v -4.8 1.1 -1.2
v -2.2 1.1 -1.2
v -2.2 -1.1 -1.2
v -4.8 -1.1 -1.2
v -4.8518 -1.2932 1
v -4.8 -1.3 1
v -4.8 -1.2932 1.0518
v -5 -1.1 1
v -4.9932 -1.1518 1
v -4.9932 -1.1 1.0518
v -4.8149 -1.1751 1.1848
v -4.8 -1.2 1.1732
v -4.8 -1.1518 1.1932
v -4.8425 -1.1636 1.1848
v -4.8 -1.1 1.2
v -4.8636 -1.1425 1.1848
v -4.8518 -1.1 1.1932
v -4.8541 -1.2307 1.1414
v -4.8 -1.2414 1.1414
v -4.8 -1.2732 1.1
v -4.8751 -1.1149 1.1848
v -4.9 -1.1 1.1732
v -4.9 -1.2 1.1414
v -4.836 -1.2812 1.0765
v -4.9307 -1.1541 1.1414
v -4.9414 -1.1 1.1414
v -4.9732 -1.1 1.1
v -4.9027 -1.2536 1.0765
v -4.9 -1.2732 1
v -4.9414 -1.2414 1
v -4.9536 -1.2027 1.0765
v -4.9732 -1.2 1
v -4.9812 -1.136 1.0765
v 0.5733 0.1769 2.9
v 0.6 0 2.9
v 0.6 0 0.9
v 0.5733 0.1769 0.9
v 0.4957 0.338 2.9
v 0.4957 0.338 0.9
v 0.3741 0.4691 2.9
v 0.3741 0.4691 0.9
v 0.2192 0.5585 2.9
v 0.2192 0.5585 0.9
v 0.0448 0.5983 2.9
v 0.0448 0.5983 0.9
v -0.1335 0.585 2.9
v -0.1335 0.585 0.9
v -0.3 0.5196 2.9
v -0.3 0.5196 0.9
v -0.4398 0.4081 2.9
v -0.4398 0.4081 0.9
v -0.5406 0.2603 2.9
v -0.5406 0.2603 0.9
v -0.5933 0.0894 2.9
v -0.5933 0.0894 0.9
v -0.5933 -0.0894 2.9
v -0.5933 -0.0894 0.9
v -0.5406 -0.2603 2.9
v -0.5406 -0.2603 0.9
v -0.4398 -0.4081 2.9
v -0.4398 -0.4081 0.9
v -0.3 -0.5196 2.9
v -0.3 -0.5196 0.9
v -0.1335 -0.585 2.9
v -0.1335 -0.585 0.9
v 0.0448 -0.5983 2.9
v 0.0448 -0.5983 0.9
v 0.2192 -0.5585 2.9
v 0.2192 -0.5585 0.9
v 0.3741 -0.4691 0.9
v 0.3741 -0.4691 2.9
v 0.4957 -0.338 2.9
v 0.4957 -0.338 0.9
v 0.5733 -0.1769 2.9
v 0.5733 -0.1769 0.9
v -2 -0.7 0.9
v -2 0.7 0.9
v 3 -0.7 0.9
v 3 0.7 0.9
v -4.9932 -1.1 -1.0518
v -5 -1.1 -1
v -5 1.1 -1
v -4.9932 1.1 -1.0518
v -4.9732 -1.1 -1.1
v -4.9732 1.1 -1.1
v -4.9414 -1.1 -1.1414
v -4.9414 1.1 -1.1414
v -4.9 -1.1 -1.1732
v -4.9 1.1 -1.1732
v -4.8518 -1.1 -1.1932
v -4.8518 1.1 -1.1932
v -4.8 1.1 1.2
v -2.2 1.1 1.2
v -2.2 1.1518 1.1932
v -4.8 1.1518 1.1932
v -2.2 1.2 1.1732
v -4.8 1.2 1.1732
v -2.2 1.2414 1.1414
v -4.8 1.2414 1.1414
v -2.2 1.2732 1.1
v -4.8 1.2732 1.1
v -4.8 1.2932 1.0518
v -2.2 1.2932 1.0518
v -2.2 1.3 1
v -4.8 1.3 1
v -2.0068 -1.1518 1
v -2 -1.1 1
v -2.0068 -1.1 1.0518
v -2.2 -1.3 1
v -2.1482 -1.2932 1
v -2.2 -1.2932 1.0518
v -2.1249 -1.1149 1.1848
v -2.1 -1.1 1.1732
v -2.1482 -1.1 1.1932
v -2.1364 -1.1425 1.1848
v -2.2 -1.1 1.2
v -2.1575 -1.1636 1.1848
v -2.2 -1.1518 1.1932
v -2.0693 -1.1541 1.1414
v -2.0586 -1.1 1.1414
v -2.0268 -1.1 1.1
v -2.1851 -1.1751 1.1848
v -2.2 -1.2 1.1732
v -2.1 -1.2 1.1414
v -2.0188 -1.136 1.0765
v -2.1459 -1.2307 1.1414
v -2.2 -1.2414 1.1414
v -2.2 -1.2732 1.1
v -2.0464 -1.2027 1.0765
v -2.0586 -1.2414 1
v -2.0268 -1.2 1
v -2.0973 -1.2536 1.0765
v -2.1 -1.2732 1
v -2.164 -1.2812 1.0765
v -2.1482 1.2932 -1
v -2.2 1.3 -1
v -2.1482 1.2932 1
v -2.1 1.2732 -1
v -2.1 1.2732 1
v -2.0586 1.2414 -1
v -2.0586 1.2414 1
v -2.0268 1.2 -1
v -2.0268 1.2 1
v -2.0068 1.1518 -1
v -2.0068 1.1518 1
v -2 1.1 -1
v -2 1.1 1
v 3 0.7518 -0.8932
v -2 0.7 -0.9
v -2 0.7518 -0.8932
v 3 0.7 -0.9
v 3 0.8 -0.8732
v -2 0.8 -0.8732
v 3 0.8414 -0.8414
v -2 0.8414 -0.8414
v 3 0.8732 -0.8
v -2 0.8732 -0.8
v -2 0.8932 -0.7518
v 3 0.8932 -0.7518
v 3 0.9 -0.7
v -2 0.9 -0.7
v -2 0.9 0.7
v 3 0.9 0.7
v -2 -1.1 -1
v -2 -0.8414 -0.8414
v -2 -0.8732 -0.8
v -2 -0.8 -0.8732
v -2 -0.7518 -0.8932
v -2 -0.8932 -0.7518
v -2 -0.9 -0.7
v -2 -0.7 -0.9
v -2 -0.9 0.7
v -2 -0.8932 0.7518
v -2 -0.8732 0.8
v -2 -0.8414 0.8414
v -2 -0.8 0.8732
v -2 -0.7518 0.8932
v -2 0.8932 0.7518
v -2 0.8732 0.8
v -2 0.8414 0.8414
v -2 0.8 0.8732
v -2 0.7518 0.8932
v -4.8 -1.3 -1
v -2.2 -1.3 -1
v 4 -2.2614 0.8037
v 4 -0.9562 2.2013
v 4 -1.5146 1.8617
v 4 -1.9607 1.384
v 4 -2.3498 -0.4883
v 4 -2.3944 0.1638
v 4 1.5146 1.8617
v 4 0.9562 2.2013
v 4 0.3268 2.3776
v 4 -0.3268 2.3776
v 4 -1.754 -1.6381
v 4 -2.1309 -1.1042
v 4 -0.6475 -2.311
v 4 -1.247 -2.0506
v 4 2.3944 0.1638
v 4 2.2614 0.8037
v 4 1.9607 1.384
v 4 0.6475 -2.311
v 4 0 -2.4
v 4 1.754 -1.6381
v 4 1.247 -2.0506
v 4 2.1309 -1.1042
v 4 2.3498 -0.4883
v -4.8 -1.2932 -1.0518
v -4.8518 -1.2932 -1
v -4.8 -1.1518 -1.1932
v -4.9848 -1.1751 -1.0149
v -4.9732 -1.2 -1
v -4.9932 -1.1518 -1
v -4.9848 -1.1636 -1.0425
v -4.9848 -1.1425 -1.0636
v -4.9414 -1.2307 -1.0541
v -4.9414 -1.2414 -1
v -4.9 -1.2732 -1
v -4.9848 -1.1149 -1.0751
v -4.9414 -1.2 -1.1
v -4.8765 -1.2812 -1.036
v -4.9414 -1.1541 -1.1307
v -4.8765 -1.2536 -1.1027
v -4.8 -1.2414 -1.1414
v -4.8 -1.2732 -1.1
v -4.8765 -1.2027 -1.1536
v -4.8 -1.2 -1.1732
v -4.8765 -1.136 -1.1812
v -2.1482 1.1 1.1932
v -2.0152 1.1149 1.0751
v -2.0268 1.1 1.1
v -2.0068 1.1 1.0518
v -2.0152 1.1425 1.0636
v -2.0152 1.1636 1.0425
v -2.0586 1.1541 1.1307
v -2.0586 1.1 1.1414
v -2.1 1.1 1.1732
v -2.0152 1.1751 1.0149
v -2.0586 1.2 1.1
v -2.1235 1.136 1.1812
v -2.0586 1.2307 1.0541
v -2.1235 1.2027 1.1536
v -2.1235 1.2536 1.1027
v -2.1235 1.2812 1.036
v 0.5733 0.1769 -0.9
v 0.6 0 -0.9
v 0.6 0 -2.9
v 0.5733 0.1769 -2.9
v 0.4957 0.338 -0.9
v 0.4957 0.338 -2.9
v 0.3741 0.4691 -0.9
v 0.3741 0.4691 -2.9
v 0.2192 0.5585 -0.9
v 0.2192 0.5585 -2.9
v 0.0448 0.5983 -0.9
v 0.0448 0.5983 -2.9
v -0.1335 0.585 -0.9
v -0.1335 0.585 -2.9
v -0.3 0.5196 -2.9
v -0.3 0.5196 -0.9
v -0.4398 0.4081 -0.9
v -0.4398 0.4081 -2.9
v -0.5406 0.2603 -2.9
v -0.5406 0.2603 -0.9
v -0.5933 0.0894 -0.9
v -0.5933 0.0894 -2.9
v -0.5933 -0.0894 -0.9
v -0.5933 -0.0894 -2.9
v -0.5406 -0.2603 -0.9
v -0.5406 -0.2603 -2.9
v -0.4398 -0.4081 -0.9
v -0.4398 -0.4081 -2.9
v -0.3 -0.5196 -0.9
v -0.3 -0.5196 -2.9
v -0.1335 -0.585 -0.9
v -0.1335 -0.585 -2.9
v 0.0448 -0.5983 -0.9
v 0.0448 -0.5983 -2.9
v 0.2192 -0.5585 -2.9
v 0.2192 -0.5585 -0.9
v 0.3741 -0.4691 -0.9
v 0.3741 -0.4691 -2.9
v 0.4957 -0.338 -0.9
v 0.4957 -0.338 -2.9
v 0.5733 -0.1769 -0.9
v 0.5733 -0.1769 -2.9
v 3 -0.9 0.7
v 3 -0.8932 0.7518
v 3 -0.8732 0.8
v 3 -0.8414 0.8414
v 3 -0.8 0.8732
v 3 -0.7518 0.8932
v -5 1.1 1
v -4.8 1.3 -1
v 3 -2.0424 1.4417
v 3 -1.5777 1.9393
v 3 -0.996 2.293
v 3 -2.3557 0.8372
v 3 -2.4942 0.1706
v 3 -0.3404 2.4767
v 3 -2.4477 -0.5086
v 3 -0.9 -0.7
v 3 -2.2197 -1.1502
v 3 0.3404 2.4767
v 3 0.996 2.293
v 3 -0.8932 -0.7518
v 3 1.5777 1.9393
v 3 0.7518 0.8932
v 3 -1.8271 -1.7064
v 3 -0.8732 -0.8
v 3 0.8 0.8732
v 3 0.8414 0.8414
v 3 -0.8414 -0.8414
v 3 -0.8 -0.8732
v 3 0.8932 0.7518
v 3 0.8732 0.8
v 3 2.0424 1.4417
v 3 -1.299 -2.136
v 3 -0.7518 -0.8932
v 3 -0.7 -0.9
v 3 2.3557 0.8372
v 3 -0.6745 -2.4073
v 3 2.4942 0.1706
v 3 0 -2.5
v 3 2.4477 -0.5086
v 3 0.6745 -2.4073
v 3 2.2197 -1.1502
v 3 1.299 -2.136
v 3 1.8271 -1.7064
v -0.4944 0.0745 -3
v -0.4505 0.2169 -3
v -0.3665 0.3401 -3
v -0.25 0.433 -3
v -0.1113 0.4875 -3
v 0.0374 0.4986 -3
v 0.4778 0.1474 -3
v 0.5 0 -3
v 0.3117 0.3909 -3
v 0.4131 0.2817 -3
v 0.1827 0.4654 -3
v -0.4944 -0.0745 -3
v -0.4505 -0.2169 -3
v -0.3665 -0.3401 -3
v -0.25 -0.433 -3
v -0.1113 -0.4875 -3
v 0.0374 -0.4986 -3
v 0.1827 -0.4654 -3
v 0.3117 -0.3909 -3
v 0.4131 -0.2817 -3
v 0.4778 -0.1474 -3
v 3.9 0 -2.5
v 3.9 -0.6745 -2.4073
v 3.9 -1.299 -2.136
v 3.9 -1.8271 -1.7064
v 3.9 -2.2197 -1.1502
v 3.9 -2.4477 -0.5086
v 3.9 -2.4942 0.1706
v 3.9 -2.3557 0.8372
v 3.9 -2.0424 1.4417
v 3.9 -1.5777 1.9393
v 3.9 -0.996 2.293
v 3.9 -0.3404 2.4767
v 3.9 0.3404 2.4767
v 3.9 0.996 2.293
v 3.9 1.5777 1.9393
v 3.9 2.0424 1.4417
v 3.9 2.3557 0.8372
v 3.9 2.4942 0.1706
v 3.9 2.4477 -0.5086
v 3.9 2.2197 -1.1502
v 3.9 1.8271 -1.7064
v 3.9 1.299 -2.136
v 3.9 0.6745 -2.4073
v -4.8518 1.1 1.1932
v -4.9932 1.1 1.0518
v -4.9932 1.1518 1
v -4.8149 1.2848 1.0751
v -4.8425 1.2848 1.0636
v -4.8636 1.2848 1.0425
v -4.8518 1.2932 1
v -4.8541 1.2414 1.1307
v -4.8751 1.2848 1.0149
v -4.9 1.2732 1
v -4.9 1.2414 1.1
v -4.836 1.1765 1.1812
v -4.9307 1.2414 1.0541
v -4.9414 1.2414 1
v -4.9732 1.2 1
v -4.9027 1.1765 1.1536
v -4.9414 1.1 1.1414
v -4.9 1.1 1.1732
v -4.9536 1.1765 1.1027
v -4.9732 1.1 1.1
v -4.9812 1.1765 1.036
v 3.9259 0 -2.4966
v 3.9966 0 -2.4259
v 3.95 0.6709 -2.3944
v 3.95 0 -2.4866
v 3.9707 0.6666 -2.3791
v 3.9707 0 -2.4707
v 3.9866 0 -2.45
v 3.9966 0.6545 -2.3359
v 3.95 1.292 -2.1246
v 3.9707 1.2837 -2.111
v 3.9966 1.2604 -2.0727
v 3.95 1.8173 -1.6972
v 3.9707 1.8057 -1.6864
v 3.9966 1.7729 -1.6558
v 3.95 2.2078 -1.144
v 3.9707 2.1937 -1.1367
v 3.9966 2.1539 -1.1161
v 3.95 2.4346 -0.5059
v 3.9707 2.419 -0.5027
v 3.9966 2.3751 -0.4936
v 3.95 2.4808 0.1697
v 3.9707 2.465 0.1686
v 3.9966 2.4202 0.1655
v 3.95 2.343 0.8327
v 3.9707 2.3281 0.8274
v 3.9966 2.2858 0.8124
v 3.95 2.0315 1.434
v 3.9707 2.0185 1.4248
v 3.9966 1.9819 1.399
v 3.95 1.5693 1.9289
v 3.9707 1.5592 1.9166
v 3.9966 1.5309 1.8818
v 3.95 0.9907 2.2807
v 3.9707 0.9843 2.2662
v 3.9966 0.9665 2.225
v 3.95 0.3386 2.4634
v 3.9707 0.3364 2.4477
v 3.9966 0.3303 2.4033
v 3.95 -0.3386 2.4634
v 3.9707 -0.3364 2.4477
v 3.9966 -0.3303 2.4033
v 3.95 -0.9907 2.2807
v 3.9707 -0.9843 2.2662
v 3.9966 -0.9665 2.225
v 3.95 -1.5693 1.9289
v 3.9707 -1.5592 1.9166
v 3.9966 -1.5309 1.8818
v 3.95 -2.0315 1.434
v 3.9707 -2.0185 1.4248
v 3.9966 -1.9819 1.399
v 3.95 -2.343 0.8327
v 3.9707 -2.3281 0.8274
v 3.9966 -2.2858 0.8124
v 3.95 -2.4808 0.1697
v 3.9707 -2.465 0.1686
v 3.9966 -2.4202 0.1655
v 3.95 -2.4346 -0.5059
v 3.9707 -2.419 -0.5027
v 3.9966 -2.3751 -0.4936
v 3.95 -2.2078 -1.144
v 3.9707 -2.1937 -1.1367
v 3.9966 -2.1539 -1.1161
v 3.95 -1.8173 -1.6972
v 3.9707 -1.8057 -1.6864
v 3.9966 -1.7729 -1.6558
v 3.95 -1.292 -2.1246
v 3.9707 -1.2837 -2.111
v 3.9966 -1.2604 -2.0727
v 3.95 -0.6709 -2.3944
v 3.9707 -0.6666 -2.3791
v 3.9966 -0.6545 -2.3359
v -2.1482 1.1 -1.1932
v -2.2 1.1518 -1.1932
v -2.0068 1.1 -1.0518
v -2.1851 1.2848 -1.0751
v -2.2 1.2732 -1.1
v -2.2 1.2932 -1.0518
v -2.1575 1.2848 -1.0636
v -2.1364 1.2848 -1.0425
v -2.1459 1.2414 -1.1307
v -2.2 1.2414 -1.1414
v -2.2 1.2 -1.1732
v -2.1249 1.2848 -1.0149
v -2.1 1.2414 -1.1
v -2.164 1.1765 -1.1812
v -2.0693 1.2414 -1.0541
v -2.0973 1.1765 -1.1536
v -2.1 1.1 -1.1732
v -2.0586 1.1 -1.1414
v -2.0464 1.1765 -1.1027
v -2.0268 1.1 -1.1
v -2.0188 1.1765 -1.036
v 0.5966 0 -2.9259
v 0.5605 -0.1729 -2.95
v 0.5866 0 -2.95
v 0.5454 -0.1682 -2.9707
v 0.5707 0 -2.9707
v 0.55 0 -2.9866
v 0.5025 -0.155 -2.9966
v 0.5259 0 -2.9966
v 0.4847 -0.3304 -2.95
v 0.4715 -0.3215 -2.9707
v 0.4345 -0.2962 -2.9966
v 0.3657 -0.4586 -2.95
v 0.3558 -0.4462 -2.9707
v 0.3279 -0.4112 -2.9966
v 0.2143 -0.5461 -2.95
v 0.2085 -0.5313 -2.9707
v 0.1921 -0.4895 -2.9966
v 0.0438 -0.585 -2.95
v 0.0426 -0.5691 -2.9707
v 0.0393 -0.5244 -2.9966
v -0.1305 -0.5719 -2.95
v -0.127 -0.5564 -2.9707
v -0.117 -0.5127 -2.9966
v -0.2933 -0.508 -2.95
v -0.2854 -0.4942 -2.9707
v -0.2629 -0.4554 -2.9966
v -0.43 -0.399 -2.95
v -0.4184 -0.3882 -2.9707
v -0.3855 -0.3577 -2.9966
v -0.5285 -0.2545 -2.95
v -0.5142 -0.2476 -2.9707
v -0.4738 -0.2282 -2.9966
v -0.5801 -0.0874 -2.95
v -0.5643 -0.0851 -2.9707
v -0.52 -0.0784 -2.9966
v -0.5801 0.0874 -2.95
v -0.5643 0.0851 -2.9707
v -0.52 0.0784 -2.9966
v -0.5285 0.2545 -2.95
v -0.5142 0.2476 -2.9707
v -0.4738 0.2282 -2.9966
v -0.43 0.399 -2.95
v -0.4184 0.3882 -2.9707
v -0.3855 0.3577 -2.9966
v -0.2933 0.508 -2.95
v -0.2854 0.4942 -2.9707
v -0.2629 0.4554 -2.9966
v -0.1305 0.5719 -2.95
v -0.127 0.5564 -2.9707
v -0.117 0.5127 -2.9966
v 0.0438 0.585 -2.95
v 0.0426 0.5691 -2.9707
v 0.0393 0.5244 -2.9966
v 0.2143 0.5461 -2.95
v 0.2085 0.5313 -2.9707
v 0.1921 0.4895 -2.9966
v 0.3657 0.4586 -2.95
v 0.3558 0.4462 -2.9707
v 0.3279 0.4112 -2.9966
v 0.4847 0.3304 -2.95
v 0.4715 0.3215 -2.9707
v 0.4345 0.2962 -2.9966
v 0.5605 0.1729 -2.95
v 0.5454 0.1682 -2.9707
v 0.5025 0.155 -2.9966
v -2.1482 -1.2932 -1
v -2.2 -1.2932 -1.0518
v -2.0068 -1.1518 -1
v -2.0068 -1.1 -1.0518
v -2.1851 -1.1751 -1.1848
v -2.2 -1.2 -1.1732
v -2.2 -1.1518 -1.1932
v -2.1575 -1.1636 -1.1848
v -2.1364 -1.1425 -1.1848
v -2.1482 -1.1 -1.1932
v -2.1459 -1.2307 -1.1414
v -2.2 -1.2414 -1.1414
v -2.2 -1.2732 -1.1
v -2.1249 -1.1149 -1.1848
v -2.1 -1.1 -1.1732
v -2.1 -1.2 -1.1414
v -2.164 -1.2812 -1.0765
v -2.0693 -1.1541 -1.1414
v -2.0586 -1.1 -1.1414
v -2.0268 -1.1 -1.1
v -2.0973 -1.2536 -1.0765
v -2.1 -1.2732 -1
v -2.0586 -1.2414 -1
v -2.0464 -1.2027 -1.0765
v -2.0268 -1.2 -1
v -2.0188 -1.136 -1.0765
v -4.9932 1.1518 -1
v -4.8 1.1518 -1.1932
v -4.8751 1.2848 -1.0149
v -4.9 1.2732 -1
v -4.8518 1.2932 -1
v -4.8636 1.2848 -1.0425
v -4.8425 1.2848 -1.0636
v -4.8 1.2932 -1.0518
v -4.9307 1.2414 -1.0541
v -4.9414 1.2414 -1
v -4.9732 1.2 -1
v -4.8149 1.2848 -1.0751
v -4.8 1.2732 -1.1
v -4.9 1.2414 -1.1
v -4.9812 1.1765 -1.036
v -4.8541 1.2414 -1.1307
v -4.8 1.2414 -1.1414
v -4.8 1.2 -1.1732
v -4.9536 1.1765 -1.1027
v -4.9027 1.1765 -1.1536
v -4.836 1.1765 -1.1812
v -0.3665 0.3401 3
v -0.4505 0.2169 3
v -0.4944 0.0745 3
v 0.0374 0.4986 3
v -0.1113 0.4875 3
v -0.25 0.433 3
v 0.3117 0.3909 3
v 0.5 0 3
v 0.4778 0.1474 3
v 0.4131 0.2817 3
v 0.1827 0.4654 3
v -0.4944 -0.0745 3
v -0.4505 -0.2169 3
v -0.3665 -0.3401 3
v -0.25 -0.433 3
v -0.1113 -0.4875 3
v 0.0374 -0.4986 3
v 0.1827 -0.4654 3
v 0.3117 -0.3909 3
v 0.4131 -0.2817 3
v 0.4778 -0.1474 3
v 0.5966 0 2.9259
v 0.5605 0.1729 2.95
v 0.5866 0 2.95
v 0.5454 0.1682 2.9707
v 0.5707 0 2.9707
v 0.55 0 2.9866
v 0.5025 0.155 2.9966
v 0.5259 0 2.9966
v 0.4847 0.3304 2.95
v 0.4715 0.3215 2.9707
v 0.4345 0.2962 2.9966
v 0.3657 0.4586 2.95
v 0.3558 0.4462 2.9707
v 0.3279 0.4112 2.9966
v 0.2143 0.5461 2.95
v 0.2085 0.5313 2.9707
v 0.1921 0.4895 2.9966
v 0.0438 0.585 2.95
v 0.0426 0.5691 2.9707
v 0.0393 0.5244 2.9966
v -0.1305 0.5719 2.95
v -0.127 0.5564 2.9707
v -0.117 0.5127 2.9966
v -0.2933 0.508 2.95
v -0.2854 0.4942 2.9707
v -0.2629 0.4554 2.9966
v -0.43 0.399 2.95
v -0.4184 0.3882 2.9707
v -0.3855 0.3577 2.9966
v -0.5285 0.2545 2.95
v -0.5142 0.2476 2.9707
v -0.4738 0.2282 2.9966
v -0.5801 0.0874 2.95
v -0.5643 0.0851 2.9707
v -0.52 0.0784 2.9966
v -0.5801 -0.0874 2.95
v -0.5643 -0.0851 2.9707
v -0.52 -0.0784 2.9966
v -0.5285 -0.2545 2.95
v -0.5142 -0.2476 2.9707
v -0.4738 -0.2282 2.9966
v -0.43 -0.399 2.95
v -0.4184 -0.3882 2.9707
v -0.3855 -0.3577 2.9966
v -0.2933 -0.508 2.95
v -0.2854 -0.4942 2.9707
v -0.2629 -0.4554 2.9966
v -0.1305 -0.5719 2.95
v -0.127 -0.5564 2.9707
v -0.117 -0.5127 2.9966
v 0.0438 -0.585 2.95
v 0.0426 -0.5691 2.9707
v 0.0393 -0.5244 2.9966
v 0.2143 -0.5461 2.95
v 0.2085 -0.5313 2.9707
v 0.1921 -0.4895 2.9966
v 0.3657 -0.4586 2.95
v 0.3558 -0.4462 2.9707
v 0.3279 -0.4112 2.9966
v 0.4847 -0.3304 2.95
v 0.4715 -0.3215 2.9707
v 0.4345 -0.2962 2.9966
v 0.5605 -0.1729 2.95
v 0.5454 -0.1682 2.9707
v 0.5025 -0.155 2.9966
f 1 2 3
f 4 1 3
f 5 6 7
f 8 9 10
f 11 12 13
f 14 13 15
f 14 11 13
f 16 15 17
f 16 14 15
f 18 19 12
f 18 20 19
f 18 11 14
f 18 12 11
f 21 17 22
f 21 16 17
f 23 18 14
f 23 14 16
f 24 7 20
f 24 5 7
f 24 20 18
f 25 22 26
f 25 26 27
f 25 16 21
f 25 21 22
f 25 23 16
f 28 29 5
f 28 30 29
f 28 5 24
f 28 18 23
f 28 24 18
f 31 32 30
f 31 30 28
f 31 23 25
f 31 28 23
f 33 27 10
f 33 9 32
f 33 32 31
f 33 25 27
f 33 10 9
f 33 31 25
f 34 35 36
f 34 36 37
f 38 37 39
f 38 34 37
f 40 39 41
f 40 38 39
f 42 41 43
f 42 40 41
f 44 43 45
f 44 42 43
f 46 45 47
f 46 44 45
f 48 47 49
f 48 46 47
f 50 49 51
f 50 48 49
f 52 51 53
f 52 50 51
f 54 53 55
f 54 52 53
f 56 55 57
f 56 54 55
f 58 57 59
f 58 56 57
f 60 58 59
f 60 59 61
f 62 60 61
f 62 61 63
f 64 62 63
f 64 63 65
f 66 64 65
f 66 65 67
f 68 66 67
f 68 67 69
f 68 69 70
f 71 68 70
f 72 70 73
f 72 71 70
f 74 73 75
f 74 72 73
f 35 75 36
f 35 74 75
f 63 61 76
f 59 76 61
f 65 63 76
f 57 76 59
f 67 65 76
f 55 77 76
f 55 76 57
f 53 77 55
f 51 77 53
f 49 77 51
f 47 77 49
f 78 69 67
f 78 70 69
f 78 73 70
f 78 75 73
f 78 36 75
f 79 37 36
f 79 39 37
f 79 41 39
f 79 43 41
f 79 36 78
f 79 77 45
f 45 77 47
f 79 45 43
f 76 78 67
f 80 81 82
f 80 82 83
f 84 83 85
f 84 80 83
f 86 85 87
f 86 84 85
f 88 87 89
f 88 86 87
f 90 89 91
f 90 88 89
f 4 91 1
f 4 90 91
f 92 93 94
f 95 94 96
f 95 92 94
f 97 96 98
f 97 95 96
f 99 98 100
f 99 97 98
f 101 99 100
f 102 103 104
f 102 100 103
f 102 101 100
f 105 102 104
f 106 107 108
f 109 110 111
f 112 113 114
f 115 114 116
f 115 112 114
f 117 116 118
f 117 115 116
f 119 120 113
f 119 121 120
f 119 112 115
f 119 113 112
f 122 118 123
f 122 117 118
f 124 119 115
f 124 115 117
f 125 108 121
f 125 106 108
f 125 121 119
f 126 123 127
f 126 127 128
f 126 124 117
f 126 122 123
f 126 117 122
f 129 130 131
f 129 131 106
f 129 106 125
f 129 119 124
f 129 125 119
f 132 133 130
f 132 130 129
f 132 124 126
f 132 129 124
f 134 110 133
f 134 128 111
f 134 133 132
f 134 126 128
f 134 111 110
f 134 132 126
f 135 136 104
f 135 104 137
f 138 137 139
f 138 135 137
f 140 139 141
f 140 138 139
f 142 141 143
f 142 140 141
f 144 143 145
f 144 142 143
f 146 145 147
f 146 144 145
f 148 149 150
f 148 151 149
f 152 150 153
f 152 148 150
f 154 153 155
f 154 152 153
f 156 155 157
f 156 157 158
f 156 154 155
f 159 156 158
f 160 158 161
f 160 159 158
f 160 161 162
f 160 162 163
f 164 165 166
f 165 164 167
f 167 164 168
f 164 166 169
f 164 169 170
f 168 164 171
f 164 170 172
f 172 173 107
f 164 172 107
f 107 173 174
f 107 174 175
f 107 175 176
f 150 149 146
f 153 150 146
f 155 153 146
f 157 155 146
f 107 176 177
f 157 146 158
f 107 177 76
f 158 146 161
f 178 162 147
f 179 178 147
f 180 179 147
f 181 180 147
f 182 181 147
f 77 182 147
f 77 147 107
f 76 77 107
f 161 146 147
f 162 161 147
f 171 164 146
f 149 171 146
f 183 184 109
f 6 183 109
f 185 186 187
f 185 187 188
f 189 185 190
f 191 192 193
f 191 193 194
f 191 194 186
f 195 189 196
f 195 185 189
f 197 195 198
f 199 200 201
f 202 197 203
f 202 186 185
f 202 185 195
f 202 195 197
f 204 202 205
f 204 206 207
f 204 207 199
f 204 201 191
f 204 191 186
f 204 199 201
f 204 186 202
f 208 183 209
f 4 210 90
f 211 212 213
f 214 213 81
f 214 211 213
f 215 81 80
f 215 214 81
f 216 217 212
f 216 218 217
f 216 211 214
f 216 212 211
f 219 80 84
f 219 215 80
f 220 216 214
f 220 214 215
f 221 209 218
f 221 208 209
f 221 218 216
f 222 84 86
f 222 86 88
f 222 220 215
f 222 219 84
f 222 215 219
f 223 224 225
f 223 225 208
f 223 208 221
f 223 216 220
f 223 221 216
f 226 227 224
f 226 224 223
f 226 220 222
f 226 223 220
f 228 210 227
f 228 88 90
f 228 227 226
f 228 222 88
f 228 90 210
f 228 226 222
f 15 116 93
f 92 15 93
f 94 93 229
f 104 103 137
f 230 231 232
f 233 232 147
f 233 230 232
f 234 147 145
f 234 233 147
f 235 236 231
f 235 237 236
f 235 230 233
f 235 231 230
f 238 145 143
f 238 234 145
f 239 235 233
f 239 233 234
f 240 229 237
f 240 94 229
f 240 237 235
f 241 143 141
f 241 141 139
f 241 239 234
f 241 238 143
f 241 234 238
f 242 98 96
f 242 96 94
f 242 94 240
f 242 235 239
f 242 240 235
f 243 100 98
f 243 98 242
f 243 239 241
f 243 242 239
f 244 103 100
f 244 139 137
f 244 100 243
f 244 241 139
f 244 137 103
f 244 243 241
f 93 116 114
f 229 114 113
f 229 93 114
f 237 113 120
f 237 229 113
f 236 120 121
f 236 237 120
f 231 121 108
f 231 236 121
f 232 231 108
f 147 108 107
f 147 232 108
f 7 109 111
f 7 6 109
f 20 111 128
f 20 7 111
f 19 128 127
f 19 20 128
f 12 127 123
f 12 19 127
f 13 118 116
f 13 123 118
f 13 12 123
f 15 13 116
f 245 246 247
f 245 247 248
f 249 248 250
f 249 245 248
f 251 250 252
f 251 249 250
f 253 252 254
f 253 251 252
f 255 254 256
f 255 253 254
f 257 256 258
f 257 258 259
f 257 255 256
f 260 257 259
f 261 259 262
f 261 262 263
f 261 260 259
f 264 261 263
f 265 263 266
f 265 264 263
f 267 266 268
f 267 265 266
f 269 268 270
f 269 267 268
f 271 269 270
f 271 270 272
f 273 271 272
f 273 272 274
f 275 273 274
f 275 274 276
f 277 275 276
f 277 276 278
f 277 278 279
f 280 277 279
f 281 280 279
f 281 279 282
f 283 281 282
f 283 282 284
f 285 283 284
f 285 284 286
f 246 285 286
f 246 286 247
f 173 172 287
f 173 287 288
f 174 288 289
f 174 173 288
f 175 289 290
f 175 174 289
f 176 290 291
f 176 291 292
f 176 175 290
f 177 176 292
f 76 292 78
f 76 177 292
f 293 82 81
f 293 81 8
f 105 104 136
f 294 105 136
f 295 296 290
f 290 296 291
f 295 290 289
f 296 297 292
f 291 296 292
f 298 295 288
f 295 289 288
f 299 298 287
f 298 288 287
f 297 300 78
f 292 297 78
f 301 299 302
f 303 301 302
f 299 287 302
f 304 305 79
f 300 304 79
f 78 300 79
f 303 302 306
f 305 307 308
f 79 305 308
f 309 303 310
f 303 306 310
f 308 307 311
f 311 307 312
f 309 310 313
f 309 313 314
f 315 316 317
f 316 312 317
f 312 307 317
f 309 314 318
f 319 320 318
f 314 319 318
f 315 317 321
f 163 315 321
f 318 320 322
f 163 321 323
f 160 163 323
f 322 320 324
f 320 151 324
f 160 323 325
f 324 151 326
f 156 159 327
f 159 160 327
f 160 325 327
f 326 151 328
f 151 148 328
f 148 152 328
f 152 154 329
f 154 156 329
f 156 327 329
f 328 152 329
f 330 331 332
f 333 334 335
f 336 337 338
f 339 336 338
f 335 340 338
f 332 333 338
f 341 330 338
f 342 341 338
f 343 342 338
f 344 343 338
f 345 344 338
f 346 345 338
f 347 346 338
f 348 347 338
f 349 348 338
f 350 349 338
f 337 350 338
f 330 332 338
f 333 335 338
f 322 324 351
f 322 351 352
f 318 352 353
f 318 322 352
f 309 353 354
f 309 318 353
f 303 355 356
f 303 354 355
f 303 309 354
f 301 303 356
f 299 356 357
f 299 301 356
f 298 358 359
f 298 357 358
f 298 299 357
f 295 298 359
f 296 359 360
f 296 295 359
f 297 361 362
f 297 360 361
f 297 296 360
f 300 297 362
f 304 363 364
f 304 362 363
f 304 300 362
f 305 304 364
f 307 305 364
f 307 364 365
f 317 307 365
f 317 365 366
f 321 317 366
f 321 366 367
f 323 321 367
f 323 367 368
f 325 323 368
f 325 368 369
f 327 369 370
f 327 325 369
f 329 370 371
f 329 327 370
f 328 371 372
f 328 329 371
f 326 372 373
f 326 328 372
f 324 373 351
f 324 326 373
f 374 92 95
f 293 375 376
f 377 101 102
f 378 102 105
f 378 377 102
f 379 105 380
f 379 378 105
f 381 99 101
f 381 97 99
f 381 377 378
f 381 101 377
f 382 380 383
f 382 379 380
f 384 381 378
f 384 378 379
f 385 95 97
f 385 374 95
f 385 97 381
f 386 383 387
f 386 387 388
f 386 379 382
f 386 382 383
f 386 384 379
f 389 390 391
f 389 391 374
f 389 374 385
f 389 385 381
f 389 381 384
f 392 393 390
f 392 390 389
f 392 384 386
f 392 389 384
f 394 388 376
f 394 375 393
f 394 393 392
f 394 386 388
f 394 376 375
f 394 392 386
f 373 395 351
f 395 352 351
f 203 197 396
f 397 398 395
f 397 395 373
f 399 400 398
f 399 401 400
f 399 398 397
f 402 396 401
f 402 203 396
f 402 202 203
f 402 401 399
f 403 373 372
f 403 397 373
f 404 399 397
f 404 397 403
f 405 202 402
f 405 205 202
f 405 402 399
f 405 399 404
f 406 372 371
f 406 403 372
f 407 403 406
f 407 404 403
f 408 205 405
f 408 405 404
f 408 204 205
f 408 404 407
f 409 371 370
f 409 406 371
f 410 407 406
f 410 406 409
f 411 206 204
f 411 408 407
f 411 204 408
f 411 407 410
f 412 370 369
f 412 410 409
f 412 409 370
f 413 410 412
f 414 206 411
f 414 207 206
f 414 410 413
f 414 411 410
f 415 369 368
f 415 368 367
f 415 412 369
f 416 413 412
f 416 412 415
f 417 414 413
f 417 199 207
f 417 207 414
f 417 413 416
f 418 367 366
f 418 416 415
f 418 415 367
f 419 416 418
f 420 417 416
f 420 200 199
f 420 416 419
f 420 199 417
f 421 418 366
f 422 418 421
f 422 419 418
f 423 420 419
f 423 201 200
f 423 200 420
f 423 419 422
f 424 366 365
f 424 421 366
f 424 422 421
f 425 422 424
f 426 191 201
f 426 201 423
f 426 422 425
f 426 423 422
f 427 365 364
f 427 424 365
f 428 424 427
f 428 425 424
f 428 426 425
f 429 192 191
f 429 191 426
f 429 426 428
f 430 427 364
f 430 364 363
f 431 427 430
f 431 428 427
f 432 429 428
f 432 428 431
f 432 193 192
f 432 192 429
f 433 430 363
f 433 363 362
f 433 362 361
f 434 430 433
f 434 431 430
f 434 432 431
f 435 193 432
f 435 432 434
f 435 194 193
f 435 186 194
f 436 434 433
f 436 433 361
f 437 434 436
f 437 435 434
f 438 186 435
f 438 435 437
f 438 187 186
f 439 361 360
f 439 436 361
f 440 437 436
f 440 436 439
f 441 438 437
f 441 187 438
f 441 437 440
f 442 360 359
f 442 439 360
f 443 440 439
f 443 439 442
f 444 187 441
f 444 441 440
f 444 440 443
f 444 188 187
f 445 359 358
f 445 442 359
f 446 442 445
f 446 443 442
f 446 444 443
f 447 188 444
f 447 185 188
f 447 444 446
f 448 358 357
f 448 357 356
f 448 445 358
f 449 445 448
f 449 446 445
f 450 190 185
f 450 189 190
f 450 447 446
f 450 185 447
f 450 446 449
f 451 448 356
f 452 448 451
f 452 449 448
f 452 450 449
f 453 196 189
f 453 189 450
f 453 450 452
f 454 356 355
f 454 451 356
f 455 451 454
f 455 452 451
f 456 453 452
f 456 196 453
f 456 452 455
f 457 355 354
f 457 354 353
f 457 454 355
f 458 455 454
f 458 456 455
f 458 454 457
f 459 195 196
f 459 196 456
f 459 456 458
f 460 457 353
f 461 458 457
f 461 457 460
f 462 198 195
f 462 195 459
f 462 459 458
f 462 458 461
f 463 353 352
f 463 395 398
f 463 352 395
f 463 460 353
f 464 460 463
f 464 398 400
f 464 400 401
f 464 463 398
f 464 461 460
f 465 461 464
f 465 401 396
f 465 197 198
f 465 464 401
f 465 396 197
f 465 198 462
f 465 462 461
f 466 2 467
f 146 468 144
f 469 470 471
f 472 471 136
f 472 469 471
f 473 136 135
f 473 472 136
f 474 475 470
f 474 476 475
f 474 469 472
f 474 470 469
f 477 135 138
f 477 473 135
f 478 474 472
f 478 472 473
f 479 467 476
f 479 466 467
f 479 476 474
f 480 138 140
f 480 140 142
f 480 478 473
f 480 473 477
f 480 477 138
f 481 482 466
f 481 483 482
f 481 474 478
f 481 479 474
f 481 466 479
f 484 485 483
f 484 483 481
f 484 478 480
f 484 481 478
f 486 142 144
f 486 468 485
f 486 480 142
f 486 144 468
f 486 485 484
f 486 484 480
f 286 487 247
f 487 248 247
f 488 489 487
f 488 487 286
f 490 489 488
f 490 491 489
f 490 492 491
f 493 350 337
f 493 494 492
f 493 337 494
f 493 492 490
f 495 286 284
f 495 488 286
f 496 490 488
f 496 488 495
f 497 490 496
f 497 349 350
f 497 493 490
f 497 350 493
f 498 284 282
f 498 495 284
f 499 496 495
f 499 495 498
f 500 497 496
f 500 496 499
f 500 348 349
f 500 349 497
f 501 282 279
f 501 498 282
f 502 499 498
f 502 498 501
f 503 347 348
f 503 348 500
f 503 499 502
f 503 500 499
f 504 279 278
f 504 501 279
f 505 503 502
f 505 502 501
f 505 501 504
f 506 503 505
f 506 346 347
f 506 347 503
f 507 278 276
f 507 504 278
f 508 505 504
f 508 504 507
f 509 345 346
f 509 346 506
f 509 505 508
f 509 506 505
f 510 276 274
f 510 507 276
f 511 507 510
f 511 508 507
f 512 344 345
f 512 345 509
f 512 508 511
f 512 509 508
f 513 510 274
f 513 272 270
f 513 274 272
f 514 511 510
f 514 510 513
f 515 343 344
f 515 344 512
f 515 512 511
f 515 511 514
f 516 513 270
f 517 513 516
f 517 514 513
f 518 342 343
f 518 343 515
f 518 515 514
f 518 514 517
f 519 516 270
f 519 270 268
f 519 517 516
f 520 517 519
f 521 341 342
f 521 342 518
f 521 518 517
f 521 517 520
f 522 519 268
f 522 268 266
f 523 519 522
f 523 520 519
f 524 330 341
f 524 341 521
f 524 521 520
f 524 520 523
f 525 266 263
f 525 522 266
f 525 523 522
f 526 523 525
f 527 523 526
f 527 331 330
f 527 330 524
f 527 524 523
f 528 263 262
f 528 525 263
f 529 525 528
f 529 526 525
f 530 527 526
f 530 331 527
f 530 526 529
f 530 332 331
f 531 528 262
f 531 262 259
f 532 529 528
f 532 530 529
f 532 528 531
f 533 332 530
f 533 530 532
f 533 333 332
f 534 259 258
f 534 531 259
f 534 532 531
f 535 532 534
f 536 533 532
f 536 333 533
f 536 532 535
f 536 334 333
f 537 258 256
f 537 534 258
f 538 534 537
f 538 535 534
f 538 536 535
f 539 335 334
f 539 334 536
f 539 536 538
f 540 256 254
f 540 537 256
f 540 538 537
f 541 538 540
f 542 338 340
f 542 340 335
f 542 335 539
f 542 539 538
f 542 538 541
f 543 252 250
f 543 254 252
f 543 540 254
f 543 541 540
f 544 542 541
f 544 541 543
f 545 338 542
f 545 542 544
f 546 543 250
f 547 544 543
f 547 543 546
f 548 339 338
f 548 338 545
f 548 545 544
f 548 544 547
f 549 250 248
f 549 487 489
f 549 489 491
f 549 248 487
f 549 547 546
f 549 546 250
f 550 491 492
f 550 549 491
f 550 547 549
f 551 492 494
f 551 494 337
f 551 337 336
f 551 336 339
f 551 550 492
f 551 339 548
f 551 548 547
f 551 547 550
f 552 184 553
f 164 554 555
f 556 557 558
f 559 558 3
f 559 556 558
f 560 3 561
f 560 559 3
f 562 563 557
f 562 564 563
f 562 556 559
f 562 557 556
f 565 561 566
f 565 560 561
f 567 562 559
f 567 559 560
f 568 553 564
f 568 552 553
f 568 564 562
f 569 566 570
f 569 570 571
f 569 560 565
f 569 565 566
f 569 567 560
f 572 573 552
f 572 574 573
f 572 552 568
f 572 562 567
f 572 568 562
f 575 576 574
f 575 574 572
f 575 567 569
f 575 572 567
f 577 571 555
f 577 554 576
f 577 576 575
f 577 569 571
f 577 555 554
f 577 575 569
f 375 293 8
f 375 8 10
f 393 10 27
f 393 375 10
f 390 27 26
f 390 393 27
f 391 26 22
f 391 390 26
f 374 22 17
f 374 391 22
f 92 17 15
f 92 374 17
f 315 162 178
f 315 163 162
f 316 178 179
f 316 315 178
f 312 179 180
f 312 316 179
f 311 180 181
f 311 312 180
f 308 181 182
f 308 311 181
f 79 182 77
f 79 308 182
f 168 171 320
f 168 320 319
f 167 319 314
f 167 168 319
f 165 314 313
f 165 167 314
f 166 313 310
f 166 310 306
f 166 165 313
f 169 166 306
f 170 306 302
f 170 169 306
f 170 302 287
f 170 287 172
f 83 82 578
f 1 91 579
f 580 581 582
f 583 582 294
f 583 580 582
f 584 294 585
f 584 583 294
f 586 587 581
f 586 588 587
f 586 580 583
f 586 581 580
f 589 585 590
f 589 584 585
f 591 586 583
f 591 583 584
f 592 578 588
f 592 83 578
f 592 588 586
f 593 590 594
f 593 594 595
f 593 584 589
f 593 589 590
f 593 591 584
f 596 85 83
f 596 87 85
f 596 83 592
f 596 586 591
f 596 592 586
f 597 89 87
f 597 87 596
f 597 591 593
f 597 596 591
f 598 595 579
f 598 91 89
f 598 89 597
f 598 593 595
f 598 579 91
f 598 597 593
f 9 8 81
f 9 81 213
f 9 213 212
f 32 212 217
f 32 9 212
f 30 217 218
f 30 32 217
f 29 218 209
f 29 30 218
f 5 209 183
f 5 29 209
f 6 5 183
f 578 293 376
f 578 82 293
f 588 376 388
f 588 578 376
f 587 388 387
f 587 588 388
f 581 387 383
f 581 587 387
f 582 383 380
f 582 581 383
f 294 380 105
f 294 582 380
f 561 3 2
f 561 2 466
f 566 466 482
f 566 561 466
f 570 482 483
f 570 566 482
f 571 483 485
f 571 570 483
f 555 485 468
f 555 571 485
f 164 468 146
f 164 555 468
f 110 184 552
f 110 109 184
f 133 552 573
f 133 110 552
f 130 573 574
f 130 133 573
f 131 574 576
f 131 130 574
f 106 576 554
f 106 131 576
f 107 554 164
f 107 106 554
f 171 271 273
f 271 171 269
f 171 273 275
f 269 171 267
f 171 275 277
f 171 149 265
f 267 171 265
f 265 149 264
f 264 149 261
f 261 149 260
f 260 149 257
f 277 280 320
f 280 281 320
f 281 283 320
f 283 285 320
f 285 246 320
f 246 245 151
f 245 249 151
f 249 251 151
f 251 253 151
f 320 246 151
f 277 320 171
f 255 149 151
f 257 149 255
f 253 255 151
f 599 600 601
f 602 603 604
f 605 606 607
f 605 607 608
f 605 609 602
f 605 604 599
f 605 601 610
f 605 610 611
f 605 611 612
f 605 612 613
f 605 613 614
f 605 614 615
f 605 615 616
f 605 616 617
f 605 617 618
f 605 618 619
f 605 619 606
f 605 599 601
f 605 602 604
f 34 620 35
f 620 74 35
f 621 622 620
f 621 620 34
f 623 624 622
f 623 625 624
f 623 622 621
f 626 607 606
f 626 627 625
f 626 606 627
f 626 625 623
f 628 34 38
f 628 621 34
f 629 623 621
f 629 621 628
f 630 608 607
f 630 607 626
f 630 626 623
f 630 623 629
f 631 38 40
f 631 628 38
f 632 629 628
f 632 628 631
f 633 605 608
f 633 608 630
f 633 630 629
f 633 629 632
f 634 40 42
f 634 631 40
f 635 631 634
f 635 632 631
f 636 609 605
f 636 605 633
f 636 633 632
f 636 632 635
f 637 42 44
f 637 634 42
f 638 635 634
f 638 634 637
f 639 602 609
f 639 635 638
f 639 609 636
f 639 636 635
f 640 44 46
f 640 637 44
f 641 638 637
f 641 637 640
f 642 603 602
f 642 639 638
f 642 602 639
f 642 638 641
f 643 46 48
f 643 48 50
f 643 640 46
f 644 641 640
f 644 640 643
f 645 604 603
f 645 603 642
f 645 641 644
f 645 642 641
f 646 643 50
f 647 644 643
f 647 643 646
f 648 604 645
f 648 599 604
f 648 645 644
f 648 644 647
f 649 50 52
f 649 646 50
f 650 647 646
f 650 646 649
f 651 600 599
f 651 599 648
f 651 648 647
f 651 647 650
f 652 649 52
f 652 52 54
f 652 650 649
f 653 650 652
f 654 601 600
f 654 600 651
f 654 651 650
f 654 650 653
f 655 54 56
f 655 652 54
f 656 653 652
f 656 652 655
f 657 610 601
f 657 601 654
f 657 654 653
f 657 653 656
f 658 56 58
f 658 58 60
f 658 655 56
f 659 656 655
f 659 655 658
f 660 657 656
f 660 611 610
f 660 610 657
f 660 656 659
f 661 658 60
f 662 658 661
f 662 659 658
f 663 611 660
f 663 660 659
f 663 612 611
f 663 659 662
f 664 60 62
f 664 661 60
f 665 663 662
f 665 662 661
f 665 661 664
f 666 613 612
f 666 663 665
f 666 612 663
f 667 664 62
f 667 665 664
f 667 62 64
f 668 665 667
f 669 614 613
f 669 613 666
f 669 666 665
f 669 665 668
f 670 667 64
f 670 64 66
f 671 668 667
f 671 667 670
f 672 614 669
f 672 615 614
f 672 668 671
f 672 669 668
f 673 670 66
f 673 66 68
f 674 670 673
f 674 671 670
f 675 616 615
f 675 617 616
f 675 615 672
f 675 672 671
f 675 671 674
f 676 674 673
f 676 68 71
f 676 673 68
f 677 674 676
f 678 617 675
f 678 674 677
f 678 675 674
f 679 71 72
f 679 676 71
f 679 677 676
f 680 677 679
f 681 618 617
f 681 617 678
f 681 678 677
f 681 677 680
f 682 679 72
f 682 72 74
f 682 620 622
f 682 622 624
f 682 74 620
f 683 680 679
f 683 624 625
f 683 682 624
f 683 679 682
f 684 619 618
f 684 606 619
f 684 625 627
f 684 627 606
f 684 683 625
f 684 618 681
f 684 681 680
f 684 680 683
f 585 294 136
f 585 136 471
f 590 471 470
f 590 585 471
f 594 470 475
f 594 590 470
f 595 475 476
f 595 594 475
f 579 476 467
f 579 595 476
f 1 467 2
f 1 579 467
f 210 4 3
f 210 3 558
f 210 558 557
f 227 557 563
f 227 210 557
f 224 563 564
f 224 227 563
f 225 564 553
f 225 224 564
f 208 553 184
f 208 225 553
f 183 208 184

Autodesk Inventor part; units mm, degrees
ref_plane "YZ Plane" through (0, 0, 0) normal (1, 0, 0) x (0, 1, 0)
sketch "Sketch1" plane through (0, 0, 0) normal (0, 0, 1) x (1, 0, 0)
  circle A0 centre (0, 0) radius 0.6
  dimension "d0" = 1.2
extrude "Extrusion1" add sketch "Sketch1" against normal mid plane 6
sketch "Sketch3" plane through (0, 0, 0) normal (0, 0, 1) x (1, 0, 0)
  line L0 (0, 0) -> (3, 0)
  line L1 (0, 0) -> (-2, 0)
  line L2 (-2, 0) -> (-2, 0.9)
  line L3 (3, 0) -> (3, -0.9)
  line L4 (-2, 0.9) -> (3, 0.9)
  line L5 (3, 0.9) -> (3, -0.9)
  line L6 (3, -0.9) -> (-2, -0.9)
  line L7 (-2, -0.9) -> (-2, 0.9)
  dimension "d4" = 3
  dimension "d5" = 2
  dimension "d6" = 0.9
  dimension "d7" = 0.9
extrude "Extrusion2" add sketch "Sketch3" along normal mid plane 1.8
fillet "Fillet1" radius 0.2 4 edges at (0.5, 0.9, 0.9) (0.5, -0.9, 0.9) (0.5, 0.9, -0.9) (0.5, -0.9, -0.9)
ref_plane "Work Plane1" through (3, -0.7, -0.9) normal (1, 0, 0) x (0, 0, -1)
sketch "Sketch4" plane through (3, -0.7, -0.9) normal (1, 0, 0) x (0, 0, -1)
  circle A0 centre (-0.9, 0.7) radius 2.5
  dimension "d12" = 5
extrude "Extrusion3" add sketch "Sketch4" along normal blind 1
ref_plane "Work Plane2" through (-2, -0.7, 0.9) normal (-1, 0, 0) x (0, 0, 1)
sketch "Sketch5" plane through (-2, -0.7, 0.9) normal (-1, 0, 0) x (0, 0, 1)
  line L0 (-2.1, -0.6) -> (0.3, -0.6)
  line L1 (0.3, -0.6) -> (0.3, 2)
  line L2 (0.3, 2) -> (-2.1, 2)
  line L3 (-2.1, 2) -> (-2.1, -0.6)
  line L4 (-2.1, -0.6) -> (0.3, 2) construction
  line L5 (0.3, -0.6) -> (-2.1, 2) construction
  point P0 (-0.9, 0.7)
  dimension "d16" = 2.4
  dimension "d17" = 2.6
extrude "Extrusion4" add sketch "Sketch5" along normal blind 3
fillet "Fillet2" radius 0.2 12 edges at (-2, -1.3, 0) (-3.5, -1.3, -1.2) (-2, 0, -1.2) (-5, 0, -1.2) (-5, -1.3, 0) (-3.5, -1.3, 1.2) (-5, 0, 1.2) (-5, 1.3, 0) (-3.5, 1.3, 1.2) (-3.5, 1.3, -1.2) (-2, 1.3, 0) (-2, 0, 1.2)
fillet "Fillet3" radius 0.1 3 edges at (4, 0, 2.5) (-0.6, 0, 3) (-0.6, 0, -3)
properties part number "New_ThinGripper_base"
